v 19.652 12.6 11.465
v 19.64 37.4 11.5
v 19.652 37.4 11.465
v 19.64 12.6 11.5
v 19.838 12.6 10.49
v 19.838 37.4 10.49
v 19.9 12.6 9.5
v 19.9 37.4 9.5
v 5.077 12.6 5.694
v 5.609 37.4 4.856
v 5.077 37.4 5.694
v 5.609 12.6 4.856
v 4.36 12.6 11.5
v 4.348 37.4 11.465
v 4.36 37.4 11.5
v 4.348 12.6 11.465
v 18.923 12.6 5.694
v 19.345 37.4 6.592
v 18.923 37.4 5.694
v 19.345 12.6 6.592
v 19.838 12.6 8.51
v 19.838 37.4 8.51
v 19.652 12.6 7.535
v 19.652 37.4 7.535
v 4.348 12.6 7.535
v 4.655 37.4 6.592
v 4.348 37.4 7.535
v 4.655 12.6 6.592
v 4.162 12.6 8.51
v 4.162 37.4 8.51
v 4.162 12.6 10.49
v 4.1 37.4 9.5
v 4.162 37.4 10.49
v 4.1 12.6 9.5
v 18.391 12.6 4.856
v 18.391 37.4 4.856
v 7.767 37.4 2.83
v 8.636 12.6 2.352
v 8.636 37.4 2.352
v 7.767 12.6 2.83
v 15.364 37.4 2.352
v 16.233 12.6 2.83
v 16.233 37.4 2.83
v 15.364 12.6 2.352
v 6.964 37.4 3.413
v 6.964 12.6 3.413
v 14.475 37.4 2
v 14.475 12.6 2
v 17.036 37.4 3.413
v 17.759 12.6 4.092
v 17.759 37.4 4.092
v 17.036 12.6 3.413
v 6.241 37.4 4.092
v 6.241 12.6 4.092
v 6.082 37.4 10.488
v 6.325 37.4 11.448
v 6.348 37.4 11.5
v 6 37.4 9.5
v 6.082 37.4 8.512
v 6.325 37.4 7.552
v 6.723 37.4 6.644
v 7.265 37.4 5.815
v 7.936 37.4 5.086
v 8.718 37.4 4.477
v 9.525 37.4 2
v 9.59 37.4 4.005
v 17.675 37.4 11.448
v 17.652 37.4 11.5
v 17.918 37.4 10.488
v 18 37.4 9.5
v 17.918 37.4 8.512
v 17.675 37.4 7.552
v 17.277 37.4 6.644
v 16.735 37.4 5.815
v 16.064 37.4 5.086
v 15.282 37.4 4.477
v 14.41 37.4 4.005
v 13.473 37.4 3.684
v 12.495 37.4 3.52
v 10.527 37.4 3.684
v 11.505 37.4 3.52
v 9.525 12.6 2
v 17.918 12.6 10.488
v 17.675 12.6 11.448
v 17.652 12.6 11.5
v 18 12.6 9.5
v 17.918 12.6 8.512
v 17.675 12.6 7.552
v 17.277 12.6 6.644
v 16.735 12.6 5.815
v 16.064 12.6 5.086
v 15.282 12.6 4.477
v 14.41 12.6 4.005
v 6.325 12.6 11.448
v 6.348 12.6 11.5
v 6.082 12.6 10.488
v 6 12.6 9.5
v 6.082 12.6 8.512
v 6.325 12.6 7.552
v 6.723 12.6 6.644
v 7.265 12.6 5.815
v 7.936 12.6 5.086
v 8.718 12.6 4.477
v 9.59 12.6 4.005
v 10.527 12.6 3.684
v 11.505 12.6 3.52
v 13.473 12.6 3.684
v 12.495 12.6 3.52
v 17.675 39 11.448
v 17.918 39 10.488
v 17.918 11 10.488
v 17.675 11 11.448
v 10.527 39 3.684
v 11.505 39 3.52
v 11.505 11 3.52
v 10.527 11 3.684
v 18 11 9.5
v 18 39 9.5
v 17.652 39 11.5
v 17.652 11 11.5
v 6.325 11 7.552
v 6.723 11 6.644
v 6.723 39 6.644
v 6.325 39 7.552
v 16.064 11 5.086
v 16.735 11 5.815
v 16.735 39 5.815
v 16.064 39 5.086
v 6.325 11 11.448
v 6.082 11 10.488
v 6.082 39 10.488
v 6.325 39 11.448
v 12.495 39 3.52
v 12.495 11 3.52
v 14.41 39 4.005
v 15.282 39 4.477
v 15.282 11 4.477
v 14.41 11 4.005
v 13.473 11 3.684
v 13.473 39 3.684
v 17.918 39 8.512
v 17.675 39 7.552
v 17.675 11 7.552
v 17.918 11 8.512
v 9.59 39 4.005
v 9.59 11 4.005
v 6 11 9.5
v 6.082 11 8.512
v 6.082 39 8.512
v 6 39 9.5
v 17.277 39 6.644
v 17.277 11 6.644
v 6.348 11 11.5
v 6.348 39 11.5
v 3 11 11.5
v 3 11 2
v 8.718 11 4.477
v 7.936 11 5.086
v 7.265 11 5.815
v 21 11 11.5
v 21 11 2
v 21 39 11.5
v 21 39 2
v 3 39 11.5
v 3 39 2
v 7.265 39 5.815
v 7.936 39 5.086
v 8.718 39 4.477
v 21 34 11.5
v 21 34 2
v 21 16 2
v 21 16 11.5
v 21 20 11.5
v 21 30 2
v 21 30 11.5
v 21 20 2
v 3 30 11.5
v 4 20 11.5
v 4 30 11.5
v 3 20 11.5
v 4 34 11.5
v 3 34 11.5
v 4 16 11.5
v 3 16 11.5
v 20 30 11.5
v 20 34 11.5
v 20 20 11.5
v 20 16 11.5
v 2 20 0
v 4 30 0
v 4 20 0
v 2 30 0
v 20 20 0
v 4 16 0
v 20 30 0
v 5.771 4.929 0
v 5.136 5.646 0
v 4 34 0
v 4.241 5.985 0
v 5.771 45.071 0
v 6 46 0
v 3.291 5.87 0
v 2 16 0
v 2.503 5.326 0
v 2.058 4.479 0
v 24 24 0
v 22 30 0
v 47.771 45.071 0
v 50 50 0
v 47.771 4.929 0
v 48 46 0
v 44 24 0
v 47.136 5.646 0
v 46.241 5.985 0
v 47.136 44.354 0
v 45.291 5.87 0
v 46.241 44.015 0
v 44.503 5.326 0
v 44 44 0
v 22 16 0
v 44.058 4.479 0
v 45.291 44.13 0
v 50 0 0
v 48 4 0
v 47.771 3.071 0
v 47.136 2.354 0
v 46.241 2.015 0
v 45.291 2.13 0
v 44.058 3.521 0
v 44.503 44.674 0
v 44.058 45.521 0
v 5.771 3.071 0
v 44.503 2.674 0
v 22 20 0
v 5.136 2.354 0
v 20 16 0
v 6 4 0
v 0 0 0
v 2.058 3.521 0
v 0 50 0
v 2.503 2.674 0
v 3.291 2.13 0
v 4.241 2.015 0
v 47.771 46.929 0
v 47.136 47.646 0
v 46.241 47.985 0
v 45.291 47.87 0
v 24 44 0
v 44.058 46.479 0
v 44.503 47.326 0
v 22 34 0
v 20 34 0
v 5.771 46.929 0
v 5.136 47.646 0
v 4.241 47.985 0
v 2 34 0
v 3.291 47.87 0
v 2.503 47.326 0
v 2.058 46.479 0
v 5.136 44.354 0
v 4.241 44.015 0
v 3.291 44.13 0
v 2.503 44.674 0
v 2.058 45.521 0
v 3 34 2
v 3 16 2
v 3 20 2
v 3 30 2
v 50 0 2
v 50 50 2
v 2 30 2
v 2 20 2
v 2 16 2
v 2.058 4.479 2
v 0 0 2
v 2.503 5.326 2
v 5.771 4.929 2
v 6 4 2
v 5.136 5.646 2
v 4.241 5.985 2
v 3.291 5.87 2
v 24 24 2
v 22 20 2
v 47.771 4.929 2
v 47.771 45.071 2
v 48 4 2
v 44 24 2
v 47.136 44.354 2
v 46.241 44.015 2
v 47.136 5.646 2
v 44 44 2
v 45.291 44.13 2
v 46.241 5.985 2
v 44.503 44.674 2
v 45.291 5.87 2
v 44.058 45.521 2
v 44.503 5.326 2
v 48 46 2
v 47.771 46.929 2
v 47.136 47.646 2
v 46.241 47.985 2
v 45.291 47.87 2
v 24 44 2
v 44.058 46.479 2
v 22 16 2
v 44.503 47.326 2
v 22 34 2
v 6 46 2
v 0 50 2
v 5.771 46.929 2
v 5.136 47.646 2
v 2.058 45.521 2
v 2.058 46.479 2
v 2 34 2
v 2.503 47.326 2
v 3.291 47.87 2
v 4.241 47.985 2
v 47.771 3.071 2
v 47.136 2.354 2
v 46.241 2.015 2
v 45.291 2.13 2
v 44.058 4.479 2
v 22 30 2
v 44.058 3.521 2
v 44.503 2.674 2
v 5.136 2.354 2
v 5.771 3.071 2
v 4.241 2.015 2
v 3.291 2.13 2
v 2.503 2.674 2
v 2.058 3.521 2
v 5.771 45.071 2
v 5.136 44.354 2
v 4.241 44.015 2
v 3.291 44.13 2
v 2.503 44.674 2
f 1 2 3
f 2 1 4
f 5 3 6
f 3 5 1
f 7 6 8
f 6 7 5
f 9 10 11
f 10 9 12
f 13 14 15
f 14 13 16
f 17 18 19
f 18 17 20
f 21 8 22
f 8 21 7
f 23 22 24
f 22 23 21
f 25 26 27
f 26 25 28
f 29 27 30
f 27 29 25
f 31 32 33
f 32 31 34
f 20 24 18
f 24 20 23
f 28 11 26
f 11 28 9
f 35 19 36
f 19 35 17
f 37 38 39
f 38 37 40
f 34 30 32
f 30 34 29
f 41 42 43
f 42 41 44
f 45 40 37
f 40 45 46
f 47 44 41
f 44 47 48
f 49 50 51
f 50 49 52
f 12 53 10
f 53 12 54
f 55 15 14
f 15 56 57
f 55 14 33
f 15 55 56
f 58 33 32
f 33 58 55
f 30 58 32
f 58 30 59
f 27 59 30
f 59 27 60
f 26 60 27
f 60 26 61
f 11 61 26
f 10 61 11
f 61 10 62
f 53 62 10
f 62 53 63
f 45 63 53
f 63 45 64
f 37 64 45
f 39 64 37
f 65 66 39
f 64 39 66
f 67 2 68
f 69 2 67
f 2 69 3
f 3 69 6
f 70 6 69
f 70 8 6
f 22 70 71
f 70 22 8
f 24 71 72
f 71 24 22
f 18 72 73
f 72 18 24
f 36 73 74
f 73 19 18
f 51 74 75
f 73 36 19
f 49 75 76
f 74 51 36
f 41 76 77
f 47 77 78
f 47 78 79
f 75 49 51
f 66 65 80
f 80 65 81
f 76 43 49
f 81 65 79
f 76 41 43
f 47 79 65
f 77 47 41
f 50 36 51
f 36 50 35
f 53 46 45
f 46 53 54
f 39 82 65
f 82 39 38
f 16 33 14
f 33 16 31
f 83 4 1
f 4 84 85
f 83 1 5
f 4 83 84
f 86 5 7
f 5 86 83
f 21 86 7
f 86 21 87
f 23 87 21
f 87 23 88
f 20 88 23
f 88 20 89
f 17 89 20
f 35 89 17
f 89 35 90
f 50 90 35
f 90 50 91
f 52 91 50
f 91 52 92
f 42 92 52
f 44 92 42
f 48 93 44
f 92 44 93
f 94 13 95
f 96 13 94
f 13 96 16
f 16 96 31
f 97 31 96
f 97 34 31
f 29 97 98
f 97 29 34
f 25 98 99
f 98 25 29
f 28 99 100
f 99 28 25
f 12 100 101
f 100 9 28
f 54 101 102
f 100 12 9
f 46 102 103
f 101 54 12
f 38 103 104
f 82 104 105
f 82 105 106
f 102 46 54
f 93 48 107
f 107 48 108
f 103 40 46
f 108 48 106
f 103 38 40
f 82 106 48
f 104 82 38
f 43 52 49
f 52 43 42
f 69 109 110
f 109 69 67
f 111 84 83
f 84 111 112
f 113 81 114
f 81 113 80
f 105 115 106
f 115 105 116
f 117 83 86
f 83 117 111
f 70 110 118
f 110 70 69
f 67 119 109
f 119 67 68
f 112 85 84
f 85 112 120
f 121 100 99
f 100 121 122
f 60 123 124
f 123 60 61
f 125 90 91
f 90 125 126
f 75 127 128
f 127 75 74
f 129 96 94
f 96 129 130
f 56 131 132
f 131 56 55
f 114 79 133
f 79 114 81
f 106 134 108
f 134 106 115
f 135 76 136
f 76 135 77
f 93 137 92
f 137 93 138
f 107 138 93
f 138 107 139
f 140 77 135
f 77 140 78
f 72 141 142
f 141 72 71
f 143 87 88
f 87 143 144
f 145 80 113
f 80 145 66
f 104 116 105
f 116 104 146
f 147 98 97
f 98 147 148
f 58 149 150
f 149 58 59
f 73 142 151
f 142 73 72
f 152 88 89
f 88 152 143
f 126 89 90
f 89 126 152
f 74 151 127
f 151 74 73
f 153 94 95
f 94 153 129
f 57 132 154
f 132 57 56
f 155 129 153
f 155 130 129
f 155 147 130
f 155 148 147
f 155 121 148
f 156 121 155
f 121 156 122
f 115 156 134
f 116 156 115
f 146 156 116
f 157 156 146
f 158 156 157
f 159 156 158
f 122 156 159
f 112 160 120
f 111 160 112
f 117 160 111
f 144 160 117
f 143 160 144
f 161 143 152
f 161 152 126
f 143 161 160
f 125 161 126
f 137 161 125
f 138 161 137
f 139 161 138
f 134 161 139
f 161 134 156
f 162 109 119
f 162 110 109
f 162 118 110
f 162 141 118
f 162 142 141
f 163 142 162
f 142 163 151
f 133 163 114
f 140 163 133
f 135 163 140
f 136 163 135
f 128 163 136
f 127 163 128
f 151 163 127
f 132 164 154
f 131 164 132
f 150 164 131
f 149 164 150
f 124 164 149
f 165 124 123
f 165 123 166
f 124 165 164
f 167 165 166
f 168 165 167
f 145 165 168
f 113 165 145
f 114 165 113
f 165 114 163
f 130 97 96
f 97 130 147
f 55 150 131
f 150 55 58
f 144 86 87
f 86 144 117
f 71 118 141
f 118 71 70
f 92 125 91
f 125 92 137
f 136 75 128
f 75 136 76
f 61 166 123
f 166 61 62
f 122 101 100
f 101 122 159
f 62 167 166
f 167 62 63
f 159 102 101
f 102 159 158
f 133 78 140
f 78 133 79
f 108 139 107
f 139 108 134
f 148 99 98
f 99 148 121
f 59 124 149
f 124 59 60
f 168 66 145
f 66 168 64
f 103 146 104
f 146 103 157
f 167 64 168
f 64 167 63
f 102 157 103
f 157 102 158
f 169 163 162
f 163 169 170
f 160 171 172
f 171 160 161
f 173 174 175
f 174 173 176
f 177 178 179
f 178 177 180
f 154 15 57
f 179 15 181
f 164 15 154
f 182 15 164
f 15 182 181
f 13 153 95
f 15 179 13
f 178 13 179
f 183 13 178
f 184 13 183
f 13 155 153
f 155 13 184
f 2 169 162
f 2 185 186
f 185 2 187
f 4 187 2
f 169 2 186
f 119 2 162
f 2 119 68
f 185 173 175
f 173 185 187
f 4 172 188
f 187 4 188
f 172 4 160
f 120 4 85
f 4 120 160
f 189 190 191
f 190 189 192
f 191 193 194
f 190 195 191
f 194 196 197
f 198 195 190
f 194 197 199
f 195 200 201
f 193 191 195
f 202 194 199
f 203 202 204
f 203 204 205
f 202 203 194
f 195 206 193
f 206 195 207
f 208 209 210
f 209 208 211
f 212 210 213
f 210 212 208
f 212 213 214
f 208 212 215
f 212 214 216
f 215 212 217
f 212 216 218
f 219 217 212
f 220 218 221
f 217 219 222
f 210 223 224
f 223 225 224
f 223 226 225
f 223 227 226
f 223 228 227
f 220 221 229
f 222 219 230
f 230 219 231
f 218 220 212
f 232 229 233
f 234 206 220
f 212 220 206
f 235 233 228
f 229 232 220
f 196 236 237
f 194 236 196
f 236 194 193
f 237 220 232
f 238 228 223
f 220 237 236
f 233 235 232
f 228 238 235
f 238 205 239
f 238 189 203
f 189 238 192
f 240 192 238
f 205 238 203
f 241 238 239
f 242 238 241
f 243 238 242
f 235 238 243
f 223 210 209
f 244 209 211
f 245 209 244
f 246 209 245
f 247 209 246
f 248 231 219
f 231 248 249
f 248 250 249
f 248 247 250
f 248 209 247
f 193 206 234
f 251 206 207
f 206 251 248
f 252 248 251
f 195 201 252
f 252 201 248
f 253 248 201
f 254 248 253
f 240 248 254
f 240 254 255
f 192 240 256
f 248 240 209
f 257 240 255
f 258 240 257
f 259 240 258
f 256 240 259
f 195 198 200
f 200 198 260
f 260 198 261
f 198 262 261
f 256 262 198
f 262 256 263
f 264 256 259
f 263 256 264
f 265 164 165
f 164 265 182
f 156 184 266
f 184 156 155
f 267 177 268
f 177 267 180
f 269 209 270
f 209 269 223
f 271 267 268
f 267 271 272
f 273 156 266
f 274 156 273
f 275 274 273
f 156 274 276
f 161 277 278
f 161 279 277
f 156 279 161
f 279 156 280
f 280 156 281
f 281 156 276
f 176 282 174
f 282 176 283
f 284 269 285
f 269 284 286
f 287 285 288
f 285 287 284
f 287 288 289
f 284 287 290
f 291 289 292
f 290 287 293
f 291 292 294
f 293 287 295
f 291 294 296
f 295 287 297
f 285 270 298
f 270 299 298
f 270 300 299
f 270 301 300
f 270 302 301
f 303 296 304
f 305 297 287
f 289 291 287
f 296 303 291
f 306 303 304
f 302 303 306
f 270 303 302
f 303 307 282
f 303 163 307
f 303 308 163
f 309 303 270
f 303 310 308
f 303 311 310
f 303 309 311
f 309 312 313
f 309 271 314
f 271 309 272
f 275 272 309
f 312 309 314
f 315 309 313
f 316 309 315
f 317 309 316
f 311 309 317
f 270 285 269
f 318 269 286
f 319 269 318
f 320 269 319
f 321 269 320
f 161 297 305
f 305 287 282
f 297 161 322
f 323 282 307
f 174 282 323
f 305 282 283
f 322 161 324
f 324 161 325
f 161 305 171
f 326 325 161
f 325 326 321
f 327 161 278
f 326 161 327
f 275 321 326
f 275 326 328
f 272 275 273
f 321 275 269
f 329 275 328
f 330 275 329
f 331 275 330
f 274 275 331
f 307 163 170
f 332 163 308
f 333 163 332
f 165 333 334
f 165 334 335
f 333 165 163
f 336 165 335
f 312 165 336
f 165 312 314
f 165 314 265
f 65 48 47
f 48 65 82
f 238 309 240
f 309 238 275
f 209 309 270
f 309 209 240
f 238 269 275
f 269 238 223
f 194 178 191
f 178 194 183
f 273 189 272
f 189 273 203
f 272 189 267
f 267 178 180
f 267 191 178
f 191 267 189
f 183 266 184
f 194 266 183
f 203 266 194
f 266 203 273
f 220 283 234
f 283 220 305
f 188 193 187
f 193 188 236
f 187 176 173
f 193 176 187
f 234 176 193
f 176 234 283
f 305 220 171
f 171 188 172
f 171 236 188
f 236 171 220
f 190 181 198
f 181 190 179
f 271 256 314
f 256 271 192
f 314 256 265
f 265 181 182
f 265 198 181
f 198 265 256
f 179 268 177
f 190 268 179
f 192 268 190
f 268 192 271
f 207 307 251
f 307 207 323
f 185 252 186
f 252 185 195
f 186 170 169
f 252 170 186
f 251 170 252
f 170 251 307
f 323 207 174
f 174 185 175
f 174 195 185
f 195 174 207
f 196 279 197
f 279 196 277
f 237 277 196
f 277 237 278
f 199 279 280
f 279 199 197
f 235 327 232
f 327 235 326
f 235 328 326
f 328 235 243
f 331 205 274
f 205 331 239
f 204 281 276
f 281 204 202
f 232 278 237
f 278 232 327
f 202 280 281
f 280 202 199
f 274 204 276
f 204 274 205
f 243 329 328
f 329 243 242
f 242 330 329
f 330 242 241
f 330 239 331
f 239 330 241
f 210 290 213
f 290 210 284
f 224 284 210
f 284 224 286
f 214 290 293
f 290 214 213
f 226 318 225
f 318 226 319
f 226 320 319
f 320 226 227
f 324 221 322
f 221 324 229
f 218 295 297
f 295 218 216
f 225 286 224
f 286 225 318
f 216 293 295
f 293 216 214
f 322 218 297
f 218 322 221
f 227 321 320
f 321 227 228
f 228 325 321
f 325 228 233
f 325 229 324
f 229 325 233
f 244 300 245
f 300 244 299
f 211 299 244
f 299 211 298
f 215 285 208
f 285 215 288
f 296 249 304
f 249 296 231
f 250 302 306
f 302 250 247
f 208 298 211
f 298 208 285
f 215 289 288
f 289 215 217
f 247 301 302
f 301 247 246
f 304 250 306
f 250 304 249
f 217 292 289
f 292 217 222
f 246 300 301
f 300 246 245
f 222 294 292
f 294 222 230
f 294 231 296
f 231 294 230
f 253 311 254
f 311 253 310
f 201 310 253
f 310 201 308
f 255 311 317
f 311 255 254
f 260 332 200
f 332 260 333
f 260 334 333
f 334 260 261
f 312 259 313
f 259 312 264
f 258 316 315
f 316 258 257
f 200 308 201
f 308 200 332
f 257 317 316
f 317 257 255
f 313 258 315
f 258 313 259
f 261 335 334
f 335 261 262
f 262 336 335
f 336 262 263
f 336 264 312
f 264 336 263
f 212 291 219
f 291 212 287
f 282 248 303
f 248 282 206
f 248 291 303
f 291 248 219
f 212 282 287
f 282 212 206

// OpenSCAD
$fa = 1;
$fs = 1;
s = 50;
t = 0.4;
w = 2;
vd = 4 / 2;

module support() {
   ch1 = 15 / 2 + 4;
   ch2 = 15 / 2;
   translate([0, 0, ch1/2]) {
		difference() {
			cube([18,28,ch1], true);
			translate([0, 0, ch2/2]) {
				rotate(90, [1, 0, 0]) {
				   cylinder(24 + 2 * t, 15/2 + t, 15/2 + t, true);
					cylinder(28, 6, 6, true);
				}
			}
		}
	}
}

module vis(x, y) {
   translate([x, y, w/2]) cylinder(w, vd, vd, true);
}

module bride(x, y) {
   translate([x, y, 10]) cube([2,4,20], true);
}
   p = 4;

difference() {
	union() {
	cube([s,s,w]);
		translate([9+3, s/2, 0]) {
			support();
		}
	}
   bride(3, 18);
   bride(21, 18);
   bride(3, 32);
   bride(21, 32);
	vis(p, p);
	vis(s-p, p);
	vis(s-p, s-p);
	vis(p, s-p);
	translate([s/2 + 9, s/2 + 9, w/2]) cube([20, 20, w], true);
}
